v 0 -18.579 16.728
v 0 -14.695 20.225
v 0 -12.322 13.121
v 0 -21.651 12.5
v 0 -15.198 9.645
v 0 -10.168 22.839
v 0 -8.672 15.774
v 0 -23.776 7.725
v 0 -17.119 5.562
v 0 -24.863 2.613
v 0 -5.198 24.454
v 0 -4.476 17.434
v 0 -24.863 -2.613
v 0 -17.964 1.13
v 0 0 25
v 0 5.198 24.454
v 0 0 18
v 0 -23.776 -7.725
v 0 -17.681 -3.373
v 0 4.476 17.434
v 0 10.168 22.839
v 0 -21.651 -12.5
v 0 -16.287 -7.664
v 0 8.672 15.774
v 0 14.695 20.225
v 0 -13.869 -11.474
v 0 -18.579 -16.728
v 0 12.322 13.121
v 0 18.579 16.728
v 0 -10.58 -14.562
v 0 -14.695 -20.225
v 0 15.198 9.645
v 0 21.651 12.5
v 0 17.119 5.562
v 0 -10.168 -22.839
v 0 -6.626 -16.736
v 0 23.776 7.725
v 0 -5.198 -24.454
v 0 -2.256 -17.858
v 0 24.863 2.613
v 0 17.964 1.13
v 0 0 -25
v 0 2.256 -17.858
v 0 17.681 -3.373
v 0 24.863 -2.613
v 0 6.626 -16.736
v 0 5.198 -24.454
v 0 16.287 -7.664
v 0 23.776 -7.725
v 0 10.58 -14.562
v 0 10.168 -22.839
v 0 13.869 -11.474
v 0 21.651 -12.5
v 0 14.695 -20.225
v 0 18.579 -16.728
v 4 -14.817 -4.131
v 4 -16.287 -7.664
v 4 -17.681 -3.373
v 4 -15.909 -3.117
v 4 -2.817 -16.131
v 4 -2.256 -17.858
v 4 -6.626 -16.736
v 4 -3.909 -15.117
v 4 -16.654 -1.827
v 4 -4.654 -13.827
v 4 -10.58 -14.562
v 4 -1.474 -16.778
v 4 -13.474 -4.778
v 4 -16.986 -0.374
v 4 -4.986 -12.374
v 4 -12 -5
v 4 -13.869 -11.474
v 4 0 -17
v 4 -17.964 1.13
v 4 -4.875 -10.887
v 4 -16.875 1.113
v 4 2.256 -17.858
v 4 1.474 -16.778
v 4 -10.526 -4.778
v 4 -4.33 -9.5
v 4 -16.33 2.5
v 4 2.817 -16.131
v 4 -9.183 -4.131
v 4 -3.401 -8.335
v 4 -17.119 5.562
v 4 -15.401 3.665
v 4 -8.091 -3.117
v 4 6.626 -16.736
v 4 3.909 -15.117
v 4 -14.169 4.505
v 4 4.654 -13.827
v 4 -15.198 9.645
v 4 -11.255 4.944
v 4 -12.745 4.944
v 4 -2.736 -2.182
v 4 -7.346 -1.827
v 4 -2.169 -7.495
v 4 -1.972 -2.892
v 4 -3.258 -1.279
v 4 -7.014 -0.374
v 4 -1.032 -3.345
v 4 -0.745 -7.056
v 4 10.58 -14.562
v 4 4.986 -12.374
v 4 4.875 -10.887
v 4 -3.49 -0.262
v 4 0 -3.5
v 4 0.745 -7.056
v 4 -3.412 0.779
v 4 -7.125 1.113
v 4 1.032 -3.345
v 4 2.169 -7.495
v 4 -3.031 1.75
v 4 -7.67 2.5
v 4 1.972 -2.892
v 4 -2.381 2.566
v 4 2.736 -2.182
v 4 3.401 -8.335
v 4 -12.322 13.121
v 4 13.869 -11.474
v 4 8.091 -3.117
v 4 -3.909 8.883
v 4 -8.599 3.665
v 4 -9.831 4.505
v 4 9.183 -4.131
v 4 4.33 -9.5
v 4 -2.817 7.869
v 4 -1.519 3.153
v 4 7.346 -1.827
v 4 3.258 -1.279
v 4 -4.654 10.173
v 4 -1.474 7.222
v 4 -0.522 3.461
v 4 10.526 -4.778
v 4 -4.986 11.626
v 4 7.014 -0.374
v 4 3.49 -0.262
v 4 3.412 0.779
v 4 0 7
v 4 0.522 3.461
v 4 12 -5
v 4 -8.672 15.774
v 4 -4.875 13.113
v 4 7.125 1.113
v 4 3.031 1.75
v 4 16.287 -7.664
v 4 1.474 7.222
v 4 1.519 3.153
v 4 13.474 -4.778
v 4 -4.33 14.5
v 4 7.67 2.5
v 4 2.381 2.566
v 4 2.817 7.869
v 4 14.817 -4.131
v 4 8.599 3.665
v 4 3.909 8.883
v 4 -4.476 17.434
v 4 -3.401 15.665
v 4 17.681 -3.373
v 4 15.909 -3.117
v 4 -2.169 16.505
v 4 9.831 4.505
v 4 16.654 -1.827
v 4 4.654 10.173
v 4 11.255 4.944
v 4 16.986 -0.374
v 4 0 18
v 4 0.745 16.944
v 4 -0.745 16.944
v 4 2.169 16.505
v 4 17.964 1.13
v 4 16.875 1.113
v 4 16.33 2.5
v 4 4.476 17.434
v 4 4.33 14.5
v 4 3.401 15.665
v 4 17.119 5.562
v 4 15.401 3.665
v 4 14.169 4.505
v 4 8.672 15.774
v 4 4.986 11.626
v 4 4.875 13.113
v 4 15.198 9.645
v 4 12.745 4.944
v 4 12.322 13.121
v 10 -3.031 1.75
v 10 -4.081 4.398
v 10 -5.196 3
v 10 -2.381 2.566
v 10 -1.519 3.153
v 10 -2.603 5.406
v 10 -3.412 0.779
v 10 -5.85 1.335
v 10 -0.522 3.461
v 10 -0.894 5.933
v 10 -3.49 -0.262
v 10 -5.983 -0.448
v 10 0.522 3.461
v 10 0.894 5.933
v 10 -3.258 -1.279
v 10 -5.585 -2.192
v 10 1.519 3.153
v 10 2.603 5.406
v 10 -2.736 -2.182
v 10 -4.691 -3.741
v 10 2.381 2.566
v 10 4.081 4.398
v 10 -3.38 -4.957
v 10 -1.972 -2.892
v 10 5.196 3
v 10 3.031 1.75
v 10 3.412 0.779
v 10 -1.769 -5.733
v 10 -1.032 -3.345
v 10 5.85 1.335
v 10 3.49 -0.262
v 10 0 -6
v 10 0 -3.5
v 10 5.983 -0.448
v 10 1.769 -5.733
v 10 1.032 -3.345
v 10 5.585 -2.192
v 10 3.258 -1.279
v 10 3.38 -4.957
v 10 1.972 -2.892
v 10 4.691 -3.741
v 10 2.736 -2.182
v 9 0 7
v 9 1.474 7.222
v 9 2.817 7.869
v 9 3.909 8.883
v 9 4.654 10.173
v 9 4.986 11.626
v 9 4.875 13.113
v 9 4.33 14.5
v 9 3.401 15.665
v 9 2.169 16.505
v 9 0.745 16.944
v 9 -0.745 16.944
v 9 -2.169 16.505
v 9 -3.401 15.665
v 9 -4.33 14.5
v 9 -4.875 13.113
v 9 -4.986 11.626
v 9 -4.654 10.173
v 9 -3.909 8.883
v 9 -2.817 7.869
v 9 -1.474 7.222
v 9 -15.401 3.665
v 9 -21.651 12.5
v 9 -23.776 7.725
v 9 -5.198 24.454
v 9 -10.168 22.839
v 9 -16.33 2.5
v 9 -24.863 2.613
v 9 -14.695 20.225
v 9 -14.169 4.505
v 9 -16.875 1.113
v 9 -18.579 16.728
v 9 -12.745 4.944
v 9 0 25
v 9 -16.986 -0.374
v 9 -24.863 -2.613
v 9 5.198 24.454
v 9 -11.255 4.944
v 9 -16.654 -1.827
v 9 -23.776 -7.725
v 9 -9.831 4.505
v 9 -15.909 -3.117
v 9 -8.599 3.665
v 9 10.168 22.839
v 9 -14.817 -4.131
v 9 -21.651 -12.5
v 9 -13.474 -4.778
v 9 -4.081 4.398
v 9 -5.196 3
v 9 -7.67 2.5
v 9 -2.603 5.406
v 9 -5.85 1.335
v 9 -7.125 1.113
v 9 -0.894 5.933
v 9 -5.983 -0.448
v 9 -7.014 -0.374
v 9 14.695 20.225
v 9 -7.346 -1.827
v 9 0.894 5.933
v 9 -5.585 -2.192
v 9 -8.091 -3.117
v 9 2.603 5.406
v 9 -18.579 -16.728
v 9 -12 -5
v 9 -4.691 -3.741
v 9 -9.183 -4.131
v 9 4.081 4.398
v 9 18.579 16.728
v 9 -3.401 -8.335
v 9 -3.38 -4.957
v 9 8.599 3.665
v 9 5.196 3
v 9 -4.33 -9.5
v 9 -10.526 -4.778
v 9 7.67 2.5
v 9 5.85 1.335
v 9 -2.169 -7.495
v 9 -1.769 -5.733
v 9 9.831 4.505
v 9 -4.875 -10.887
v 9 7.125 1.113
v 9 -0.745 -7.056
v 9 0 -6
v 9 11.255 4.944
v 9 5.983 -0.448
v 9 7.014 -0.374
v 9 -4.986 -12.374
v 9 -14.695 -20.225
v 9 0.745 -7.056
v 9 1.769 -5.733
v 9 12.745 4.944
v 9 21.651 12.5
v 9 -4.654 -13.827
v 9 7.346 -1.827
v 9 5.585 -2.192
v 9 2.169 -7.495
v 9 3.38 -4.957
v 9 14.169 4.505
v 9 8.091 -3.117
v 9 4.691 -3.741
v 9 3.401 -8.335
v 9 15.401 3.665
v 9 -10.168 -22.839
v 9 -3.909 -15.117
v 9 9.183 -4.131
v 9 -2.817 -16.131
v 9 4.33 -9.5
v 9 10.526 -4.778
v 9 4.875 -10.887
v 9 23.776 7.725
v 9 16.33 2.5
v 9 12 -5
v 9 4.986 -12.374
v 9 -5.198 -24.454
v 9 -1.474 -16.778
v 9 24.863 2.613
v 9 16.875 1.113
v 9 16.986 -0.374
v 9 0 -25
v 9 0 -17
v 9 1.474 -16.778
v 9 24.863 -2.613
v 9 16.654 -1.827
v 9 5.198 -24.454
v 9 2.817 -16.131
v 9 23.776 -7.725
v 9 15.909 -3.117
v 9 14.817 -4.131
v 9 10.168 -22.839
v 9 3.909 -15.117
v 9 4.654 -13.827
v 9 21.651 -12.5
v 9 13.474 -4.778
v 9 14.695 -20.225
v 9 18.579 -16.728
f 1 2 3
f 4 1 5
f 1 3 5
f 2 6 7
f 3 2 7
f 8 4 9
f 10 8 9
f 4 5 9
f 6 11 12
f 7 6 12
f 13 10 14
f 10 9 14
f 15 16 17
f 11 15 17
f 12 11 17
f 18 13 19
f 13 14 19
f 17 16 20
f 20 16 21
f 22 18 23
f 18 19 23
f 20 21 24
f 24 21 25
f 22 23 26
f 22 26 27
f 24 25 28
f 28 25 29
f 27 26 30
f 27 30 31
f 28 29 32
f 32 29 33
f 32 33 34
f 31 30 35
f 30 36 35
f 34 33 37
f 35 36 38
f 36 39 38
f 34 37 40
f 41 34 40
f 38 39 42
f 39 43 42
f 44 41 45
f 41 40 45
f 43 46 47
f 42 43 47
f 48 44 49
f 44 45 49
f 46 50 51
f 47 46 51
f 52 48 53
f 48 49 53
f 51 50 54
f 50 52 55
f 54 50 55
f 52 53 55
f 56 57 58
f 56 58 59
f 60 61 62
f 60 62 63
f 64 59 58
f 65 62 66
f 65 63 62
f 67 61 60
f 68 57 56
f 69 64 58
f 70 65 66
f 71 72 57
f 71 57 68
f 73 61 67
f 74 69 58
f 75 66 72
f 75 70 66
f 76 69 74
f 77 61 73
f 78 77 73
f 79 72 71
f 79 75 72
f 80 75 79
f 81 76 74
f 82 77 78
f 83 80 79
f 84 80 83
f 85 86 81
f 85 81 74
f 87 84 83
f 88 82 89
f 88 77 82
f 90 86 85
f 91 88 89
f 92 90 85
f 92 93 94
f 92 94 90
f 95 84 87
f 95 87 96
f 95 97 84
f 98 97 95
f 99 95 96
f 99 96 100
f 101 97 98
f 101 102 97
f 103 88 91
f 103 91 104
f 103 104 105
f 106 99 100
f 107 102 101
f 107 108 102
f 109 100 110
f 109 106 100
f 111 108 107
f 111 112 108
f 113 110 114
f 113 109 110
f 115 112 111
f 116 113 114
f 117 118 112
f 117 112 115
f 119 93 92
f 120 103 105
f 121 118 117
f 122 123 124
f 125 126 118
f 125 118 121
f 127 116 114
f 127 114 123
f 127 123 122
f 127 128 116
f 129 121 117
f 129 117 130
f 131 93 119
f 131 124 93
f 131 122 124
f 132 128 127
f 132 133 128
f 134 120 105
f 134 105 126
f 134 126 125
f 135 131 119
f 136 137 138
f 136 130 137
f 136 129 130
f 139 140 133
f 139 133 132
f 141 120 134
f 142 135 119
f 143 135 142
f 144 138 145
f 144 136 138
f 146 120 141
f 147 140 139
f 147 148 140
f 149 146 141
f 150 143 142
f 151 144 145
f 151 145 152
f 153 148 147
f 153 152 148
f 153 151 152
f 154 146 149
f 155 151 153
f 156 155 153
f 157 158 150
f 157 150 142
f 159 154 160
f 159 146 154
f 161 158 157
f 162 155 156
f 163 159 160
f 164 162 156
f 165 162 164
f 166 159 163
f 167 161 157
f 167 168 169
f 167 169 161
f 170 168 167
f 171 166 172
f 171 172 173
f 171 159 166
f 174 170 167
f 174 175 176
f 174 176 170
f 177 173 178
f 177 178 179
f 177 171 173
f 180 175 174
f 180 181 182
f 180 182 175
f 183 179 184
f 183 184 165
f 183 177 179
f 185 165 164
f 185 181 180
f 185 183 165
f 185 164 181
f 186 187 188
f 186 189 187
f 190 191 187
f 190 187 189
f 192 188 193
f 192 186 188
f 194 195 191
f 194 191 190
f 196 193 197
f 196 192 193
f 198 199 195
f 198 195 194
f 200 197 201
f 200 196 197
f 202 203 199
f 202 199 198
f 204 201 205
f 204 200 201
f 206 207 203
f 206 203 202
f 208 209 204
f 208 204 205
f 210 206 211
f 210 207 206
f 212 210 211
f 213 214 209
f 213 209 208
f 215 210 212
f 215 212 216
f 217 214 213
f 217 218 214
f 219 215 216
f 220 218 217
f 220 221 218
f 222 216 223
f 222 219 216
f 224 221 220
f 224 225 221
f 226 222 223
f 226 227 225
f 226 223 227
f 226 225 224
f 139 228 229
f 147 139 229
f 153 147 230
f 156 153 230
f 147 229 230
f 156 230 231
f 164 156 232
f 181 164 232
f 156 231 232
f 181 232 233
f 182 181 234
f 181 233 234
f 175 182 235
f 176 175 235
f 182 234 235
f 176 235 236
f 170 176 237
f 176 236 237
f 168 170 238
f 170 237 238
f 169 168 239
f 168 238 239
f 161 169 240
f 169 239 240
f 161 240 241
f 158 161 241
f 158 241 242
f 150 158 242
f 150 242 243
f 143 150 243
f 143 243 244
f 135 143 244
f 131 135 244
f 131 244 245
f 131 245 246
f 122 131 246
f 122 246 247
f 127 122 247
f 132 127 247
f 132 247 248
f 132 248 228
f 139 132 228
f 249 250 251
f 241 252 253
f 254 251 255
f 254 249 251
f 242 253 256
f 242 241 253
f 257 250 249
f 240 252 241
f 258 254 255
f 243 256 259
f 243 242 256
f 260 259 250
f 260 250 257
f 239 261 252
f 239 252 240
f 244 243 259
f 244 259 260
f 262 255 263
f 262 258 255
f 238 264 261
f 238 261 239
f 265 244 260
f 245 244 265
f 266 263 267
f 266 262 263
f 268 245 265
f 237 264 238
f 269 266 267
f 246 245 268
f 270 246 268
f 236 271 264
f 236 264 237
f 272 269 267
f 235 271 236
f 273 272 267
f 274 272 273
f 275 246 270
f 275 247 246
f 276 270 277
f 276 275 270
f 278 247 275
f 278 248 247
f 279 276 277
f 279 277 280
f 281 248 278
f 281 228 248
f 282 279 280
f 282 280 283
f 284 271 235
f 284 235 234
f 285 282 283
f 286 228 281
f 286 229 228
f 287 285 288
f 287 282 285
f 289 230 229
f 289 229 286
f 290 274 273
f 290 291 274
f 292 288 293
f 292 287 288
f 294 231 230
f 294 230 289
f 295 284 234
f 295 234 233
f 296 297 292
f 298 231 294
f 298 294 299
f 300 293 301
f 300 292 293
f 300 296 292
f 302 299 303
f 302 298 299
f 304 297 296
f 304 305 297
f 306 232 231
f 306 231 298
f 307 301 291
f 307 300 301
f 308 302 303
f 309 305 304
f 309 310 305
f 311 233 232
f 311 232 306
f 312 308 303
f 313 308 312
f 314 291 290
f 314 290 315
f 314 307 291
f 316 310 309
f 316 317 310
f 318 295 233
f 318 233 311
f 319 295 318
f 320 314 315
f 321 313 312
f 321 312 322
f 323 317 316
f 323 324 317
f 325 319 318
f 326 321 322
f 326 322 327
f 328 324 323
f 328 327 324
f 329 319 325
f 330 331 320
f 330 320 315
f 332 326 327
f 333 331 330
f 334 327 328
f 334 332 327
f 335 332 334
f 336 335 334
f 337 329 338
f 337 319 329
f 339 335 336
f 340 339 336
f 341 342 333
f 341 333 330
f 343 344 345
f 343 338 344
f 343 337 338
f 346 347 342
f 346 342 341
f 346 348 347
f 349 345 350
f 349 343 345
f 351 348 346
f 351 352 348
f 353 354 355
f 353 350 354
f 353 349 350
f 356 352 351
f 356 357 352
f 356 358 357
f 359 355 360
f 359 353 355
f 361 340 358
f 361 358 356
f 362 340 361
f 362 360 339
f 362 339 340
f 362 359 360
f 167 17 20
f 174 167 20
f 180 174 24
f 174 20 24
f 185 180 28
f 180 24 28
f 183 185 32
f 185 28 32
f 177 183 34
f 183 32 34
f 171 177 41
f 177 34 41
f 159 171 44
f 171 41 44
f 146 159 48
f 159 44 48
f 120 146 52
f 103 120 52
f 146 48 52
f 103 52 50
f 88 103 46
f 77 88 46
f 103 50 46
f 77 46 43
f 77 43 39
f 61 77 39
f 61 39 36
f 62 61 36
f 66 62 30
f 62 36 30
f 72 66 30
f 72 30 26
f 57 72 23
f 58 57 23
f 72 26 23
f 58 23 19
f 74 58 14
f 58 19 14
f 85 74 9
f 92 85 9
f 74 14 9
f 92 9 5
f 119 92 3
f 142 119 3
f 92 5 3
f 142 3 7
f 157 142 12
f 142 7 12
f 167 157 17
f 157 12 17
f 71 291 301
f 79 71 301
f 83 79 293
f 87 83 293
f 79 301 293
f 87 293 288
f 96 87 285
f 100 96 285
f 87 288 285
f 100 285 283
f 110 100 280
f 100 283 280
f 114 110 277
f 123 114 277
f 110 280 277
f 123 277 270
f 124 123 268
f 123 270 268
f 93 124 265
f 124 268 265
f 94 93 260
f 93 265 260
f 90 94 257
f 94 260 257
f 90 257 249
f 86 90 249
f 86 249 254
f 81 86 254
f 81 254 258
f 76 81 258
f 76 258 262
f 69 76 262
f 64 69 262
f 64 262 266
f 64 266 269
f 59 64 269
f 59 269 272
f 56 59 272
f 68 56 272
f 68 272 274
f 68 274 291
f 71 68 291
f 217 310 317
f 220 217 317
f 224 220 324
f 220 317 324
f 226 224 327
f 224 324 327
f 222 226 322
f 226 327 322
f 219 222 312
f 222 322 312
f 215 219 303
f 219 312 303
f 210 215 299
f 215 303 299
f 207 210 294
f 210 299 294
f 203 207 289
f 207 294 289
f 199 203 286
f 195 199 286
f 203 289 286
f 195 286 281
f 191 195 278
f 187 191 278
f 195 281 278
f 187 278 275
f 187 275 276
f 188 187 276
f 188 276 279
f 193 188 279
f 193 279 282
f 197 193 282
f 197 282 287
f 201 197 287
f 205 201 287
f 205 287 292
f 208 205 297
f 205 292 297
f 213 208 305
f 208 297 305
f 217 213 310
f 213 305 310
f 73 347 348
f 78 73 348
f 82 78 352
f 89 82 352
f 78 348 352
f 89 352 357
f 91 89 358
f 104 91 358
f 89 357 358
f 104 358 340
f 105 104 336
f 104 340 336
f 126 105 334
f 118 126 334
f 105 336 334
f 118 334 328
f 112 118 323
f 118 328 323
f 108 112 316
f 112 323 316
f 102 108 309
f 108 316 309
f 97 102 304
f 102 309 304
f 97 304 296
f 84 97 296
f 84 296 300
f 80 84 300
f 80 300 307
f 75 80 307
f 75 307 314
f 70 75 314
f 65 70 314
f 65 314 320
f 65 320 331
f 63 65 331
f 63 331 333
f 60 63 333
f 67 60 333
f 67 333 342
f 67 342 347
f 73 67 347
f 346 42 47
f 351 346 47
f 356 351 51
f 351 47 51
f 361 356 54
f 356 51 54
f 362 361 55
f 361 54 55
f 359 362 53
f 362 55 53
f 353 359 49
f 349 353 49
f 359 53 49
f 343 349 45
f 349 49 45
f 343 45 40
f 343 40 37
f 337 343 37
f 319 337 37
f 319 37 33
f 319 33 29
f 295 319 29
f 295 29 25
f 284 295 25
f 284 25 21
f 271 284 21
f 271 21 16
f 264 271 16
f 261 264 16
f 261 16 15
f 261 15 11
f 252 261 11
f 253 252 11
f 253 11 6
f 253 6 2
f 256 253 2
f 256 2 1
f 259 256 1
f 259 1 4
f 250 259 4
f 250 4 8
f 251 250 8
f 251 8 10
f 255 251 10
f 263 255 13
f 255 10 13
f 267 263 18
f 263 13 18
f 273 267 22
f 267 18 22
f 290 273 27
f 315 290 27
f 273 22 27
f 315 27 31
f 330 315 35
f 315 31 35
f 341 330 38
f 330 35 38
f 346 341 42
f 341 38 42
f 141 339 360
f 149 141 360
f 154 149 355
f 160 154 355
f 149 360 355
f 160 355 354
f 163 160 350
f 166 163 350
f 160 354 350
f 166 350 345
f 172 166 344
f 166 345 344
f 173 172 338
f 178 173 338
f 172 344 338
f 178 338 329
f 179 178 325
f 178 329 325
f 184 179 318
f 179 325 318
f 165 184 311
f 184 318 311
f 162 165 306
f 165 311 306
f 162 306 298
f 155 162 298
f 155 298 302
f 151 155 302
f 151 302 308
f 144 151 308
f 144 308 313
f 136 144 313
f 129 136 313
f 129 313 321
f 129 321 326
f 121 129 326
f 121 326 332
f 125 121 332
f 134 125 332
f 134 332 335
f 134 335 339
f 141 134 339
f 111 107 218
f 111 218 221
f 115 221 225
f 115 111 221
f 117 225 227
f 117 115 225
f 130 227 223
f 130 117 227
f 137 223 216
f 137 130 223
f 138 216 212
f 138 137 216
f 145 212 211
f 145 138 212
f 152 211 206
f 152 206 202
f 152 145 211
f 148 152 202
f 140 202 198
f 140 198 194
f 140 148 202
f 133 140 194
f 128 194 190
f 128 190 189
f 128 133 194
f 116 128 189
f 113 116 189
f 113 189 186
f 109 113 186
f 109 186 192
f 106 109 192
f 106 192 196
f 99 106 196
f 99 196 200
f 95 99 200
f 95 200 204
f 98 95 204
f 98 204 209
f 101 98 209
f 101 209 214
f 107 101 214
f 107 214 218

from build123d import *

# Parameters (mm, degrees)
SKETCH1_R           = 25
SKETCH1_R_2         = 3.5
BOSS_EXTRUDE1_DEPTH = 10
CUT_EXTRUDE2_START  = -1
SKETCH2_R           = 25
SKETCH2_R_2         = 6
CUT_EXTRUDE2_DEPTH  = 1
SKETCH3_R           = 5
CUT_EXTRUDE3_DEPTH  = 37.482872694
SKETCH4_R           = 18
CUT_EXTRUDE4_DEPTH  = 4


with BuildPart() as part:
    # Sketch1 → Boss-Extrude1 (new body)
    with BuildSketch(Plane(origin=(0, 0, 0), x_dir=(0, 0, -1), z_dir=(1, 0, 0))):
        Circle(SKETCH1_R)
        Circle(SKETCH1_R_2, mode=Mode.SUBTRACT)
    extrude(amount=BOSS_EXTRUDE1_DEPTH)

    # Sketch2 → Cut-Extrude2 (cut)
    with BuildSketch(Plane(origin=(10, 0, 0), x_dir=(0, 0, -1), z_dir=(1, 0, 0)).offset(CUT_EXTRUDE2_START)):
        Circle(SKETCH2_R)
        Circle(SKETCH2_R_2, mode=Mode.SUBTRACT)
    extrude(amount=CUT_EXTRUDE2_DEPTH, mode=Mode.SUBTRACT)

    # Sketch3 → Cut-Extrude3 (cut, through all)
    with BuildSketch(Plane(origin=(9, 0, 0), x_dir=(0, 0, -1), z_dir=(1, 0, 0))):
        with Locations((0, 12)):
            Circle(SKETCH3_R)
        with Locations((12, 0)):
            Circle(SKETCH3_R)
        with Locations((0, -12)):
            Circle(SKETCH3_R)
        with Locations((-12, 0)):
            Circle(SKETCH3_R)
    extrude(amount=-CUT_EXTRUDE3_DEPTH, mode=Mode.SUBTRACT)

    # Sketch4 → Cut-Extrude4 (cut)
    with BuildSketch(Plane.ZY):
        Circle(SKETCH4_R)
    extrude(amount=-CUT_EXTRUDE4_DEPTH, mode=Mode.SUBTRACT)


solid = part.part
